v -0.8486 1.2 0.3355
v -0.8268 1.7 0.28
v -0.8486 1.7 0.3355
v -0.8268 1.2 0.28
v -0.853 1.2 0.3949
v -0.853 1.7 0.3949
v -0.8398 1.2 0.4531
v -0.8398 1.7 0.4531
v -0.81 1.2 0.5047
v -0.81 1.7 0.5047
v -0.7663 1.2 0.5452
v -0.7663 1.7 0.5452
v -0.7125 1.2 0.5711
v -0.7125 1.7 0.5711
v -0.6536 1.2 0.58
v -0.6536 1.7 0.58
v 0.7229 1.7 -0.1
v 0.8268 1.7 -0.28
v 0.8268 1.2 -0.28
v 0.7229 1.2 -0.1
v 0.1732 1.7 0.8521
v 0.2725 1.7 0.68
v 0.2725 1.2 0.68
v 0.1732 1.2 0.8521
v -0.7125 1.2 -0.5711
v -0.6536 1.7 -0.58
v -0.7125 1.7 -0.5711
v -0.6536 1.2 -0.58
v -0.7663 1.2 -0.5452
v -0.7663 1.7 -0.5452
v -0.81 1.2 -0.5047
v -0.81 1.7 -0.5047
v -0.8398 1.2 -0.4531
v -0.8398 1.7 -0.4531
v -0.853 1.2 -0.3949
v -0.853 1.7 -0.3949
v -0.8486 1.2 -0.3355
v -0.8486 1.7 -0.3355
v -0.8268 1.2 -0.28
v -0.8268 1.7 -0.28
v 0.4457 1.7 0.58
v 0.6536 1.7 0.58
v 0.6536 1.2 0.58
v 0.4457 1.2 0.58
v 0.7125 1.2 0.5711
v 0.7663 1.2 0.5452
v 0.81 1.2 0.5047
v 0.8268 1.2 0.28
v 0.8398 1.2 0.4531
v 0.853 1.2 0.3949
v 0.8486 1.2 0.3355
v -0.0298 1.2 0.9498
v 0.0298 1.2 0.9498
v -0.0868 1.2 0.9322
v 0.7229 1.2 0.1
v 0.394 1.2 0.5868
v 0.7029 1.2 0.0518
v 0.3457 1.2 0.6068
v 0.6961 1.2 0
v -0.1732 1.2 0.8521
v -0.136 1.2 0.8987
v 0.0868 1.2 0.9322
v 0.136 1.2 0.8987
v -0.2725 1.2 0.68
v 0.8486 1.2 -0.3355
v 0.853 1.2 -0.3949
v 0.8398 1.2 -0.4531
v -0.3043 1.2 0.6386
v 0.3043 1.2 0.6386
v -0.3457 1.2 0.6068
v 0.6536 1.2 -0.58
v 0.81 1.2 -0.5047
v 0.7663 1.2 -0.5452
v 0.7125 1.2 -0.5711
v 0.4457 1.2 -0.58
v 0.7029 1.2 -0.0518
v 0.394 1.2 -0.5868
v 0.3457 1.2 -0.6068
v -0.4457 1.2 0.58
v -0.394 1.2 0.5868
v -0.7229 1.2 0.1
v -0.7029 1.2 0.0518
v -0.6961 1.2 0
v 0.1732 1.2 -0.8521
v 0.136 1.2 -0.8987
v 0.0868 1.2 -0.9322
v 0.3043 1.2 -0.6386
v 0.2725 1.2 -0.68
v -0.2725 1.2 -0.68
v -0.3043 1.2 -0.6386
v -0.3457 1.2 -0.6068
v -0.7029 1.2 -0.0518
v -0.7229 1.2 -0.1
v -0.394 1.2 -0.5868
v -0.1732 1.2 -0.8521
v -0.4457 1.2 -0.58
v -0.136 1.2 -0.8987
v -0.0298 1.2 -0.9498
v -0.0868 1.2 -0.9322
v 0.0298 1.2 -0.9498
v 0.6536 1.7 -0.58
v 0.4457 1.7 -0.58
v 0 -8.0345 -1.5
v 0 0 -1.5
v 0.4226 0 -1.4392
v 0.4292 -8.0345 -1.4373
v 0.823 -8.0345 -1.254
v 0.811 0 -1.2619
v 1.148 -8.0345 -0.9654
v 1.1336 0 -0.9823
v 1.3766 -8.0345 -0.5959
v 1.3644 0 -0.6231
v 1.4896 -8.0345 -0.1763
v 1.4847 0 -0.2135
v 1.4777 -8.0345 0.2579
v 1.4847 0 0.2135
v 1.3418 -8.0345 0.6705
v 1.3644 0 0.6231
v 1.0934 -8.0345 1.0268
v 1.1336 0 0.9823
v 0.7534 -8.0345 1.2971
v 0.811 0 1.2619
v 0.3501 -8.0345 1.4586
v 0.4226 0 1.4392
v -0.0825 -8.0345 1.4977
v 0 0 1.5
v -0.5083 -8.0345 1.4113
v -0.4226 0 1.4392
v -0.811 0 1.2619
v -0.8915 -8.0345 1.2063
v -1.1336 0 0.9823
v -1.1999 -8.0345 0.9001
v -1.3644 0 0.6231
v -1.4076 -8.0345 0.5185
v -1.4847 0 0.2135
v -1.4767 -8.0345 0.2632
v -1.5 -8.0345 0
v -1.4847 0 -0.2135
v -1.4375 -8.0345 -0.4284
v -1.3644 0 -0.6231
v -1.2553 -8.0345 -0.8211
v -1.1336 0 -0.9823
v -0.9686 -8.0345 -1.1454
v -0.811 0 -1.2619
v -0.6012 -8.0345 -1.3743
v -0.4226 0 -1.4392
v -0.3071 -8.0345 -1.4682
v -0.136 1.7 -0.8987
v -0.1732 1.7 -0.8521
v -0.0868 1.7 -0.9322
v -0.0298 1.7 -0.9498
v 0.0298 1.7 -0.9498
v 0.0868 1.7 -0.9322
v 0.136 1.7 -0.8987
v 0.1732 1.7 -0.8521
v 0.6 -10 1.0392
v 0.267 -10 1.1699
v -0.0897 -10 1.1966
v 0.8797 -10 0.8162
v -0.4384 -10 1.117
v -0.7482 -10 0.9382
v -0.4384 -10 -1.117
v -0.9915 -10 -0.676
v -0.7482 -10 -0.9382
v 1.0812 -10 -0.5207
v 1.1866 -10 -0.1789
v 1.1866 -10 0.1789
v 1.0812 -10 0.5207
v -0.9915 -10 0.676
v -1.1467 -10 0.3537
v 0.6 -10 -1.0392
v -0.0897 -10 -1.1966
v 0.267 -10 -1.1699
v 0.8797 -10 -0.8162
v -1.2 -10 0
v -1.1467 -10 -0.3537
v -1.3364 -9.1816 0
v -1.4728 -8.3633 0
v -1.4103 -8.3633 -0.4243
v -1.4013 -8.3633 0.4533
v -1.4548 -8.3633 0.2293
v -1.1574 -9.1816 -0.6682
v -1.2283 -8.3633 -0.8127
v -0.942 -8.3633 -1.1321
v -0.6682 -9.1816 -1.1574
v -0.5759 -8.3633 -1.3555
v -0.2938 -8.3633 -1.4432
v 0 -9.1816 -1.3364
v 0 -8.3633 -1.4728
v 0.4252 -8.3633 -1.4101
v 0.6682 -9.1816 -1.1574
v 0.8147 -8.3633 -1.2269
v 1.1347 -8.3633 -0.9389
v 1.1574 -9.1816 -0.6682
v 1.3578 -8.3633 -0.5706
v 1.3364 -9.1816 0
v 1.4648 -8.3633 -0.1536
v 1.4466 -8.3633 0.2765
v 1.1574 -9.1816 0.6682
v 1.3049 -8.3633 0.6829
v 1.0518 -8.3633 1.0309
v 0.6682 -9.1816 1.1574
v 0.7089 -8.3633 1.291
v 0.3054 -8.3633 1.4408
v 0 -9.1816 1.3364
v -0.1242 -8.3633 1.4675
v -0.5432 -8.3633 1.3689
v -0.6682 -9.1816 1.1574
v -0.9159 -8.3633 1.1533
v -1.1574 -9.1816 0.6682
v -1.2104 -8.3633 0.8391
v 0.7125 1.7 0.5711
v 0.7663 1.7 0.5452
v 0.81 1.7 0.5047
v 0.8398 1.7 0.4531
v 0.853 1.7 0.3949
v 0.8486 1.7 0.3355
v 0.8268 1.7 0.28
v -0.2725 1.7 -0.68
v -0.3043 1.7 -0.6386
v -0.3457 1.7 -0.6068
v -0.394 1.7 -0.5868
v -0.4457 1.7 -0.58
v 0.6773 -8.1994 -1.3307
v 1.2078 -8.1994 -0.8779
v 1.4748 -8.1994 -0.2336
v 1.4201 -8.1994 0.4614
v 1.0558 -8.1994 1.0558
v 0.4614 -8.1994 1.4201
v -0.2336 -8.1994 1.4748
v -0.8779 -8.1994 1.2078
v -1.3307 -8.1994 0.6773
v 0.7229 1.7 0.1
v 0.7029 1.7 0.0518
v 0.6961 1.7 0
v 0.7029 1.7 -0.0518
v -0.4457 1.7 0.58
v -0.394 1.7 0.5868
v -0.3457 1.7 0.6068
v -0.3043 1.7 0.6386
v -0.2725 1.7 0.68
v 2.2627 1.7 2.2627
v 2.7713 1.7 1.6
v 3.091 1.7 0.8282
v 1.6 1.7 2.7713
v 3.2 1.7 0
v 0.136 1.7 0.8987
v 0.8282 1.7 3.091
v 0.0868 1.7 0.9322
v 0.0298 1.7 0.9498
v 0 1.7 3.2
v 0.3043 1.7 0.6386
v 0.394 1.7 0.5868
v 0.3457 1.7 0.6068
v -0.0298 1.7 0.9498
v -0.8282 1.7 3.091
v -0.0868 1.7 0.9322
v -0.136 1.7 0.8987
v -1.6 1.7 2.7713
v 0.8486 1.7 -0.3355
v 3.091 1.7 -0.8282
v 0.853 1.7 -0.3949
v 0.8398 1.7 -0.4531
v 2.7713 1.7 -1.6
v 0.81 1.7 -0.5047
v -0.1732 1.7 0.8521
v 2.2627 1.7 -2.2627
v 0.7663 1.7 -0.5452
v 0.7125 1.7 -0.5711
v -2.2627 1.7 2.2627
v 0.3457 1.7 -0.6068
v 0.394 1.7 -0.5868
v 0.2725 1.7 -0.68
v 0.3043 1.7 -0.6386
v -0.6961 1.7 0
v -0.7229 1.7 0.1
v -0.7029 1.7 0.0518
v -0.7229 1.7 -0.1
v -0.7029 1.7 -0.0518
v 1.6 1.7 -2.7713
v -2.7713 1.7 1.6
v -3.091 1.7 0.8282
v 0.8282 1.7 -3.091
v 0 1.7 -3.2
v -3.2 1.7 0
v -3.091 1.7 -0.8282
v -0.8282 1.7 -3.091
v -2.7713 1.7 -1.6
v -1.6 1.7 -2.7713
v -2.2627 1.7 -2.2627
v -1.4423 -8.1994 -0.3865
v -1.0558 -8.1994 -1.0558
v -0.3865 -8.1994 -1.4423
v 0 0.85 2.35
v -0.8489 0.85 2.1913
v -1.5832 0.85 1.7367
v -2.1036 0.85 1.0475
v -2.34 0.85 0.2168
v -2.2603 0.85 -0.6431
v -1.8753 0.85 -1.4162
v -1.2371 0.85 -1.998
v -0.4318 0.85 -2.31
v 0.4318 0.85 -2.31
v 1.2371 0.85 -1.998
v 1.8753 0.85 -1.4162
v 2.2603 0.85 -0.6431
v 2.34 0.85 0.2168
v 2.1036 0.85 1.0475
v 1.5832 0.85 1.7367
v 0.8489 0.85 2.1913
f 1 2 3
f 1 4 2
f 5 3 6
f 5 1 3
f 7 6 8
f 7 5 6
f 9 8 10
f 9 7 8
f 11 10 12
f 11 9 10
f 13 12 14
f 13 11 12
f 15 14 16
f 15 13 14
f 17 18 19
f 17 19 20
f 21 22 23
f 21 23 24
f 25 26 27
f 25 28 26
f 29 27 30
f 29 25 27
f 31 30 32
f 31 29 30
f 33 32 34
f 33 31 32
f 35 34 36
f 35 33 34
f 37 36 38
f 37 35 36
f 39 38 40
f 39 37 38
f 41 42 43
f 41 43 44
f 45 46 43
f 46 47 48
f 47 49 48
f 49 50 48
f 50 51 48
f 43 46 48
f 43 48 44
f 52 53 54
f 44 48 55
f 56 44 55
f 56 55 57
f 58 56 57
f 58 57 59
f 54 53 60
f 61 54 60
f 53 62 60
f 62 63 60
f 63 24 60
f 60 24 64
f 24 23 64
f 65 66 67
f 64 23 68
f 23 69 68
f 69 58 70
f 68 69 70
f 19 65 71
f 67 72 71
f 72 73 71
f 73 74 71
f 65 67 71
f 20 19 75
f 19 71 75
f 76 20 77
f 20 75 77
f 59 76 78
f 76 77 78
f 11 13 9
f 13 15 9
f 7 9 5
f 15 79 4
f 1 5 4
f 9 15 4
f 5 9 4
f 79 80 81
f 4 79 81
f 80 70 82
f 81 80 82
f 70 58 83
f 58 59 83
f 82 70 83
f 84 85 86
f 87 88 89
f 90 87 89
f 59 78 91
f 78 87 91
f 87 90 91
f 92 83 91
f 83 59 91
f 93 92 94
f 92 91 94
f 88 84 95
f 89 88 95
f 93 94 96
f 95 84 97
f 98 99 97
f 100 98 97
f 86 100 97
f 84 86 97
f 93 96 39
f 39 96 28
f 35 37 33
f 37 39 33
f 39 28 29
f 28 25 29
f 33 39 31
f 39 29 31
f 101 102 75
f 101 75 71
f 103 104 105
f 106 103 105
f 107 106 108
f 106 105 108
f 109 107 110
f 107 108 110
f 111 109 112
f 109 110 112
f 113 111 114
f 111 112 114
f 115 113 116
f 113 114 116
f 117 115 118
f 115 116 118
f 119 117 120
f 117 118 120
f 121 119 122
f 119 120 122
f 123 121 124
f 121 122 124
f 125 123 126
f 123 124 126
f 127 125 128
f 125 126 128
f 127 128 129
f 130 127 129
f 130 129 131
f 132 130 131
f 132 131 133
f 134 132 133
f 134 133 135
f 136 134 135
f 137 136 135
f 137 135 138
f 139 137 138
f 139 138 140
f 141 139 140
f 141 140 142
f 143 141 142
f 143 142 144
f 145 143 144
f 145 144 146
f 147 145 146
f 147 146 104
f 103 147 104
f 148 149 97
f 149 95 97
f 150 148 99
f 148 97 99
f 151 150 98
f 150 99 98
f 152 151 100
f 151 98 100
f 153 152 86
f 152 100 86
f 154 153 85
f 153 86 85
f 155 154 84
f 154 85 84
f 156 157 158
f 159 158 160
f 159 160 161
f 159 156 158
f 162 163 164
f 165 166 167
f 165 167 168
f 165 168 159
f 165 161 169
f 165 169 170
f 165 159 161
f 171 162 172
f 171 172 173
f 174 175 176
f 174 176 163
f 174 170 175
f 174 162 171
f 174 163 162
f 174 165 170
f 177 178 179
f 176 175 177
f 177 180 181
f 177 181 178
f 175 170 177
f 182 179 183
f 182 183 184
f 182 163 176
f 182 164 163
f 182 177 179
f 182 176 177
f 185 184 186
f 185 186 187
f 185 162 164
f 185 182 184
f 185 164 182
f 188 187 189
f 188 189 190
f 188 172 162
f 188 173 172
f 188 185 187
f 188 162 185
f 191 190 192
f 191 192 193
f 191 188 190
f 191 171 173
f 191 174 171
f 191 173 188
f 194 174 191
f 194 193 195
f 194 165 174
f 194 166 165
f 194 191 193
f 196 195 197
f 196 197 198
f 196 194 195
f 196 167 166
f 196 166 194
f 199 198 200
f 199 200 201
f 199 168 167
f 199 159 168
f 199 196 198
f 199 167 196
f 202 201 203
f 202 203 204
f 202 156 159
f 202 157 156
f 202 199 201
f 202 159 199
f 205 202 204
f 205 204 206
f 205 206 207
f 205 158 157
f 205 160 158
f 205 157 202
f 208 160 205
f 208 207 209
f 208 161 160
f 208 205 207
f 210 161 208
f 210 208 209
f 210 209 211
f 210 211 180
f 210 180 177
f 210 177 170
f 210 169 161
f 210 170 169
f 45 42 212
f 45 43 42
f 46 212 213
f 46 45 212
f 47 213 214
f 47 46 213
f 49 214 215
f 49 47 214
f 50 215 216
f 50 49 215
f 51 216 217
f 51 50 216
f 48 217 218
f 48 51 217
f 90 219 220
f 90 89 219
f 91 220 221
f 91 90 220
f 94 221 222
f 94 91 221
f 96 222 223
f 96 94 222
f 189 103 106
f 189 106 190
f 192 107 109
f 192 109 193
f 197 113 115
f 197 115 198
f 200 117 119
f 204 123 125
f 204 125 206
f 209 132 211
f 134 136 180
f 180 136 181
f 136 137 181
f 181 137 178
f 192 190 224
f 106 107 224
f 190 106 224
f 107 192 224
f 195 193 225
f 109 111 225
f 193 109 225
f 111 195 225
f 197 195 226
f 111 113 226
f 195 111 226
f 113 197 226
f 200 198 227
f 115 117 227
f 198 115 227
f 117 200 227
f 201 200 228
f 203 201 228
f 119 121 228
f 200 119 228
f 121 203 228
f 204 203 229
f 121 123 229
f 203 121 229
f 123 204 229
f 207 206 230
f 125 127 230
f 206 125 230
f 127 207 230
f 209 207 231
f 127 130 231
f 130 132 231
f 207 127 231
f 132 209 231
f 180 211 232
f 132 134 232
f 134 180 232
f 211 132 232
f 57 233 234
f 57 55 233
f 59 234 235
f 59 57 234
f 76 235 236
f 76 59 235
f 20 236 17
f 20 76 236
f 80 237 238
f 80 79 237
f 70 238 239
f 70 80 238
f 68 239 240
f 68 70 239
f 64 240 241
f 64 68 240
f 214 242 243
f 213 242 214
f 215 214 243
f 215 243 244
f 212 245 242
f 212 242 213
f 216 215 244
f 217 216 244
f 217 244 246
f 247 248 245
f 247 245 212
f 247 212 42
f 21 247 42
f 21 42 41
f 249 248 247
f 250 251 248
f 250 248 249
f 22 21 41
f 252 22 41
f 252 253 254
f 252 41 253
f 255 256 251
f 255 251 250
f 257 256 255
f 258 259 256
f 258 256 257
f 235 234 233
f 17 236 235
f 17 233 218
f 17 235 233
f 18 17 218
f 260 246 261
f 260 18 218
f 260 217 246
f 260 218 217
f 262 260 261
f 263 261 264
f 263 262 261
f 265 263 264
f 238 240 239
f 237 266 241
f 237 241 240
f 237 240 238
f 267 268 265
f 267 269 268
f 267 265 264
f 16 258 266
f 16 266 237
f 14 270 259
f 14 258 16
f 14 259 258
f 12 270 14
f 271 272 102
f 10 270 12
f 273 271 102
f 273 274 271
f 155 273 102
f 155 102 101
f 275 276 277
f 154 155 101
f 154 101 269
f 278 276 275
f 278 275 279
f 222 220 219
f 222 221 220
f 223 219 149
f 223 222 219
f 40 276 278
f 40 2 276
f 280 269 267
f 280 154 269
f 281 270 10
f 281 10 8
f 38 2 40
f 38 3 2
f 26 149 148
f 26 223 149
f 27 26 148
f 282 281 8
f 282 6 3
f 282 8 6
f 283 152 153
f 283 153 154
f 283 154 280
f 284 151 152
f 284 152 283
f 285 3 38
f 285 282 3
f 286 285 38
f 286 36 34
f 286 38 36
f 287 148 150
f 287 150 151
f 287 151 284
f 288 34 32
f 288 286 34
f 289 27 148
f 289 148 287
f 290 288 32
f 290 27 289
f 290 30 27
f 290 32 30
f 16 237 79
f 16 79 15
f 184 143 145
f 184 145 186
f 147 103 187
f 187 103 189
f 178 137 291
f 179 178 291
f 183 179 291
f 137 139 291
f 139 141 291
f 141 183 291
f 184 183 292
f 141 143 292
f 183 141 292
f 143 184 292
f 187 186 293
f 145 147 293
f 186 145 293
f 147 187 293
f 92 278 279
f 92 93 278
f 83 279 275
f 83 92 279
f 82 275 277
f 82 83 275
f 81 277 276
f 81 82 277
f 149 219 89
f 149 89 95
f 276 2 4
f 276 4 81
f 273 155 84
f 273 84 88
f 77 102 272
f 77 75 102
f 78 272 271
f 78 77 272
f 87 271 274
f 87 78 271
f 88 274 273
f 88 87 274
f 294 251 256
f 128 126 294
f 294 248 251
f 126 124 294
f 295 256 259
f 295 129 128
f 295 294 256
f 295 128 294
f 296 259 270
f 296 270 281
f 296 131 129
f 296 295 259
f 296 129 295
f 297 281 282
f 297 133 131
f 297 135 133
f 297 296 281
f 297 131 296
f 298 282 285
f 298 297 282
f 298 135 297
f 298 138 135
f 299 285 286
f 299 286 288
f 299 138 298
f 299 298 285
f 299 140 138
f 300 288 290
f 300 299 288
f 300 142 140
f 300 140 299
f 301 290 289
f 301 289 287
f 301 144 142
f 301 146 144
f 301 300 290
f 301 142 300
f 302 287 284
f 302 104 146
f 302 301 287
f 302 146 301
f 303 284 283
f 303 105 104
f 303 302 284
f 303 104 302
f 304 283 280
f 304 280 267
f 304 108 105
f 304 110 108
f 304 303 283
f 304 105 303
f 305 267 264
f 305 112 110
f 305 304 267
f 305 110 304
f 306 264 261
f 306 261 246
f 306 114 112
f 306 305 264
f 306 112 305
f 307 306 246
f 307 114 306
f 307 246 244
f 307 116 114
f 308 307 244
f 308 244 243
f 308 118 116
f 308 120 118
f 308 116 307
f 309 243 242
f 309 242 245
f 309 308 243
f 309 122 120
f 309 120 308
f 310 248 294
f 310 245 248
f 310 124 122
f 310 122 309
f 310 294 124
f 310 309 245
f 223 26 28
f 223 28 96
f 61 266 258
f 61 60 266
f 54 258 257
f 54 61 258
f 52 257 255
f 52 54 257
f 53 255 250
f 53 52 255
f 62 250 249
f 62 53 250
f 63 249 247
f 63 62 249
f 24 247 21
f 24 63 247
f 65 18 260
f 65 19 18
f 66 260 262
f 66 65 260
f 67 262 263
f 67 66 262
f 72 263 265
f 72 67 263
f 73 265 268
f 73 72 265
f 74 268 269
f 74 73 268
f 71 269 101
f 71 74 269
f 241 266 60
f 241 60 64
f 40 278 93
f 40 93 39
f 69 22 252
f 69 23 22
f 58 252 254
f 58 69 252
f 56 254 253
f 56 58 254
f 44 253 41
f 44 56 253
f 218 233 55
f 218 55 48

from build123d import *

# Parameters (mm, degrees)
SKETCH2_R           = 1.5
BOSS_EXTRUDE1_DEPTH = 10
CUT_EXTRUDE1_DEPTH  = 0.5
FILLET1_R           = 0.2
FILLET3_R           = 2


with BuildPart() as part:
    # Sketch1 → Revolve1 (revolve)
    with BuildSketch(Plane.XY, mode=Mode.PRIVATE) as revolve1_sk:
        Polygon((0, 0), (0, 1.7), (3.2, 1.7), (1.5, 0), align=None)
    revolve(revolve1_sk.sketch.rotate(Axis((0, 50, 0), (0, -1, 0)), 90), axis=Axis((0, 50, 0), (0, -1, 0)))

    # Sketch2 → Boss-Extrude1 (add)
    with BuildSketch(Plane.XZ):
        with Locations(Location((0, 0, 0), (0, 0, 270))):
            Circle(SKETCH2_R)
    extrude(amount=BOSS_EXTRUDE1_DEPTH)

    # Sketch3 → Cut-Revolve1 (revolve, cut)
    with BuildSketch(Plane.XY, mode=Mode.PRIVATE) as cut_revolve1_sk:
        Polygon((1.5, -8.2), (1.2, -10), (1.5, -10), align=None)
    revolve(cut_revolve1_sk.sketch.rotate(Axis((0, 0, 0), (0, -1, 0)), 180), axis=Axis((0, 0, 0), (0, -1, 0)), mode=Mode.SUBTRACT)

    # Sketch4 → Cut-Extrude1 (cut)
    with BuildSketch(Plane(origin=(0, 1.7, 0), x_dir=(1, 0, 0), z_dir=(0, 1, 0))):
        Polygon((0, 1.152050808), (0.330273688, 0.58), (1, 0.58), (0.665136844, 0), (1, -0.58), (0.330273688, -0.58), (0, -1.152050808), (-0.330273688, -0.58), (-1, -0.58), (-0.665136844, 0), (-1, 0.58), (-0.330273688, 0.58), align=None)
    extrude(amount=-CUT_EXTRUDE1_DEPTH, mode=Mode.SUBTRACT)

    # Fillet1
    fillet1_edges = [part.edges().sort_by_distance(p)[0] for p in [
        (-0.330273688, 1.45, -0.58),
        (0, 1.45, -1.152050808),
        (0.330273688, 1.45, -0.58),
        (1, 1.45, -0.58),
        (0.665136844, 1.45, 0),
        (1, 1.45, 0.58),
        (0.330273688, 1.45, 0.58),
        (0, 1.45, 1.152050808),
        (-0.330273688, 1.45, 0.58),
        (-1, 1.45, 0.58),
        (-0.665136844, 1.45, 0),
        (-1, 1.45, -0.58),
    ]]
    fillet(fillet1_edges, radius=FILLET1_R)

    # Fillet3
    fillet3_edges = [part.edges().sort_by_distance(p)[0] for p in [
        (-1.060660172, -8.2, -1.060660172),
    ]]
    fillet(fillet3_edges, radius=FILLET3_R)


solid = part.part
